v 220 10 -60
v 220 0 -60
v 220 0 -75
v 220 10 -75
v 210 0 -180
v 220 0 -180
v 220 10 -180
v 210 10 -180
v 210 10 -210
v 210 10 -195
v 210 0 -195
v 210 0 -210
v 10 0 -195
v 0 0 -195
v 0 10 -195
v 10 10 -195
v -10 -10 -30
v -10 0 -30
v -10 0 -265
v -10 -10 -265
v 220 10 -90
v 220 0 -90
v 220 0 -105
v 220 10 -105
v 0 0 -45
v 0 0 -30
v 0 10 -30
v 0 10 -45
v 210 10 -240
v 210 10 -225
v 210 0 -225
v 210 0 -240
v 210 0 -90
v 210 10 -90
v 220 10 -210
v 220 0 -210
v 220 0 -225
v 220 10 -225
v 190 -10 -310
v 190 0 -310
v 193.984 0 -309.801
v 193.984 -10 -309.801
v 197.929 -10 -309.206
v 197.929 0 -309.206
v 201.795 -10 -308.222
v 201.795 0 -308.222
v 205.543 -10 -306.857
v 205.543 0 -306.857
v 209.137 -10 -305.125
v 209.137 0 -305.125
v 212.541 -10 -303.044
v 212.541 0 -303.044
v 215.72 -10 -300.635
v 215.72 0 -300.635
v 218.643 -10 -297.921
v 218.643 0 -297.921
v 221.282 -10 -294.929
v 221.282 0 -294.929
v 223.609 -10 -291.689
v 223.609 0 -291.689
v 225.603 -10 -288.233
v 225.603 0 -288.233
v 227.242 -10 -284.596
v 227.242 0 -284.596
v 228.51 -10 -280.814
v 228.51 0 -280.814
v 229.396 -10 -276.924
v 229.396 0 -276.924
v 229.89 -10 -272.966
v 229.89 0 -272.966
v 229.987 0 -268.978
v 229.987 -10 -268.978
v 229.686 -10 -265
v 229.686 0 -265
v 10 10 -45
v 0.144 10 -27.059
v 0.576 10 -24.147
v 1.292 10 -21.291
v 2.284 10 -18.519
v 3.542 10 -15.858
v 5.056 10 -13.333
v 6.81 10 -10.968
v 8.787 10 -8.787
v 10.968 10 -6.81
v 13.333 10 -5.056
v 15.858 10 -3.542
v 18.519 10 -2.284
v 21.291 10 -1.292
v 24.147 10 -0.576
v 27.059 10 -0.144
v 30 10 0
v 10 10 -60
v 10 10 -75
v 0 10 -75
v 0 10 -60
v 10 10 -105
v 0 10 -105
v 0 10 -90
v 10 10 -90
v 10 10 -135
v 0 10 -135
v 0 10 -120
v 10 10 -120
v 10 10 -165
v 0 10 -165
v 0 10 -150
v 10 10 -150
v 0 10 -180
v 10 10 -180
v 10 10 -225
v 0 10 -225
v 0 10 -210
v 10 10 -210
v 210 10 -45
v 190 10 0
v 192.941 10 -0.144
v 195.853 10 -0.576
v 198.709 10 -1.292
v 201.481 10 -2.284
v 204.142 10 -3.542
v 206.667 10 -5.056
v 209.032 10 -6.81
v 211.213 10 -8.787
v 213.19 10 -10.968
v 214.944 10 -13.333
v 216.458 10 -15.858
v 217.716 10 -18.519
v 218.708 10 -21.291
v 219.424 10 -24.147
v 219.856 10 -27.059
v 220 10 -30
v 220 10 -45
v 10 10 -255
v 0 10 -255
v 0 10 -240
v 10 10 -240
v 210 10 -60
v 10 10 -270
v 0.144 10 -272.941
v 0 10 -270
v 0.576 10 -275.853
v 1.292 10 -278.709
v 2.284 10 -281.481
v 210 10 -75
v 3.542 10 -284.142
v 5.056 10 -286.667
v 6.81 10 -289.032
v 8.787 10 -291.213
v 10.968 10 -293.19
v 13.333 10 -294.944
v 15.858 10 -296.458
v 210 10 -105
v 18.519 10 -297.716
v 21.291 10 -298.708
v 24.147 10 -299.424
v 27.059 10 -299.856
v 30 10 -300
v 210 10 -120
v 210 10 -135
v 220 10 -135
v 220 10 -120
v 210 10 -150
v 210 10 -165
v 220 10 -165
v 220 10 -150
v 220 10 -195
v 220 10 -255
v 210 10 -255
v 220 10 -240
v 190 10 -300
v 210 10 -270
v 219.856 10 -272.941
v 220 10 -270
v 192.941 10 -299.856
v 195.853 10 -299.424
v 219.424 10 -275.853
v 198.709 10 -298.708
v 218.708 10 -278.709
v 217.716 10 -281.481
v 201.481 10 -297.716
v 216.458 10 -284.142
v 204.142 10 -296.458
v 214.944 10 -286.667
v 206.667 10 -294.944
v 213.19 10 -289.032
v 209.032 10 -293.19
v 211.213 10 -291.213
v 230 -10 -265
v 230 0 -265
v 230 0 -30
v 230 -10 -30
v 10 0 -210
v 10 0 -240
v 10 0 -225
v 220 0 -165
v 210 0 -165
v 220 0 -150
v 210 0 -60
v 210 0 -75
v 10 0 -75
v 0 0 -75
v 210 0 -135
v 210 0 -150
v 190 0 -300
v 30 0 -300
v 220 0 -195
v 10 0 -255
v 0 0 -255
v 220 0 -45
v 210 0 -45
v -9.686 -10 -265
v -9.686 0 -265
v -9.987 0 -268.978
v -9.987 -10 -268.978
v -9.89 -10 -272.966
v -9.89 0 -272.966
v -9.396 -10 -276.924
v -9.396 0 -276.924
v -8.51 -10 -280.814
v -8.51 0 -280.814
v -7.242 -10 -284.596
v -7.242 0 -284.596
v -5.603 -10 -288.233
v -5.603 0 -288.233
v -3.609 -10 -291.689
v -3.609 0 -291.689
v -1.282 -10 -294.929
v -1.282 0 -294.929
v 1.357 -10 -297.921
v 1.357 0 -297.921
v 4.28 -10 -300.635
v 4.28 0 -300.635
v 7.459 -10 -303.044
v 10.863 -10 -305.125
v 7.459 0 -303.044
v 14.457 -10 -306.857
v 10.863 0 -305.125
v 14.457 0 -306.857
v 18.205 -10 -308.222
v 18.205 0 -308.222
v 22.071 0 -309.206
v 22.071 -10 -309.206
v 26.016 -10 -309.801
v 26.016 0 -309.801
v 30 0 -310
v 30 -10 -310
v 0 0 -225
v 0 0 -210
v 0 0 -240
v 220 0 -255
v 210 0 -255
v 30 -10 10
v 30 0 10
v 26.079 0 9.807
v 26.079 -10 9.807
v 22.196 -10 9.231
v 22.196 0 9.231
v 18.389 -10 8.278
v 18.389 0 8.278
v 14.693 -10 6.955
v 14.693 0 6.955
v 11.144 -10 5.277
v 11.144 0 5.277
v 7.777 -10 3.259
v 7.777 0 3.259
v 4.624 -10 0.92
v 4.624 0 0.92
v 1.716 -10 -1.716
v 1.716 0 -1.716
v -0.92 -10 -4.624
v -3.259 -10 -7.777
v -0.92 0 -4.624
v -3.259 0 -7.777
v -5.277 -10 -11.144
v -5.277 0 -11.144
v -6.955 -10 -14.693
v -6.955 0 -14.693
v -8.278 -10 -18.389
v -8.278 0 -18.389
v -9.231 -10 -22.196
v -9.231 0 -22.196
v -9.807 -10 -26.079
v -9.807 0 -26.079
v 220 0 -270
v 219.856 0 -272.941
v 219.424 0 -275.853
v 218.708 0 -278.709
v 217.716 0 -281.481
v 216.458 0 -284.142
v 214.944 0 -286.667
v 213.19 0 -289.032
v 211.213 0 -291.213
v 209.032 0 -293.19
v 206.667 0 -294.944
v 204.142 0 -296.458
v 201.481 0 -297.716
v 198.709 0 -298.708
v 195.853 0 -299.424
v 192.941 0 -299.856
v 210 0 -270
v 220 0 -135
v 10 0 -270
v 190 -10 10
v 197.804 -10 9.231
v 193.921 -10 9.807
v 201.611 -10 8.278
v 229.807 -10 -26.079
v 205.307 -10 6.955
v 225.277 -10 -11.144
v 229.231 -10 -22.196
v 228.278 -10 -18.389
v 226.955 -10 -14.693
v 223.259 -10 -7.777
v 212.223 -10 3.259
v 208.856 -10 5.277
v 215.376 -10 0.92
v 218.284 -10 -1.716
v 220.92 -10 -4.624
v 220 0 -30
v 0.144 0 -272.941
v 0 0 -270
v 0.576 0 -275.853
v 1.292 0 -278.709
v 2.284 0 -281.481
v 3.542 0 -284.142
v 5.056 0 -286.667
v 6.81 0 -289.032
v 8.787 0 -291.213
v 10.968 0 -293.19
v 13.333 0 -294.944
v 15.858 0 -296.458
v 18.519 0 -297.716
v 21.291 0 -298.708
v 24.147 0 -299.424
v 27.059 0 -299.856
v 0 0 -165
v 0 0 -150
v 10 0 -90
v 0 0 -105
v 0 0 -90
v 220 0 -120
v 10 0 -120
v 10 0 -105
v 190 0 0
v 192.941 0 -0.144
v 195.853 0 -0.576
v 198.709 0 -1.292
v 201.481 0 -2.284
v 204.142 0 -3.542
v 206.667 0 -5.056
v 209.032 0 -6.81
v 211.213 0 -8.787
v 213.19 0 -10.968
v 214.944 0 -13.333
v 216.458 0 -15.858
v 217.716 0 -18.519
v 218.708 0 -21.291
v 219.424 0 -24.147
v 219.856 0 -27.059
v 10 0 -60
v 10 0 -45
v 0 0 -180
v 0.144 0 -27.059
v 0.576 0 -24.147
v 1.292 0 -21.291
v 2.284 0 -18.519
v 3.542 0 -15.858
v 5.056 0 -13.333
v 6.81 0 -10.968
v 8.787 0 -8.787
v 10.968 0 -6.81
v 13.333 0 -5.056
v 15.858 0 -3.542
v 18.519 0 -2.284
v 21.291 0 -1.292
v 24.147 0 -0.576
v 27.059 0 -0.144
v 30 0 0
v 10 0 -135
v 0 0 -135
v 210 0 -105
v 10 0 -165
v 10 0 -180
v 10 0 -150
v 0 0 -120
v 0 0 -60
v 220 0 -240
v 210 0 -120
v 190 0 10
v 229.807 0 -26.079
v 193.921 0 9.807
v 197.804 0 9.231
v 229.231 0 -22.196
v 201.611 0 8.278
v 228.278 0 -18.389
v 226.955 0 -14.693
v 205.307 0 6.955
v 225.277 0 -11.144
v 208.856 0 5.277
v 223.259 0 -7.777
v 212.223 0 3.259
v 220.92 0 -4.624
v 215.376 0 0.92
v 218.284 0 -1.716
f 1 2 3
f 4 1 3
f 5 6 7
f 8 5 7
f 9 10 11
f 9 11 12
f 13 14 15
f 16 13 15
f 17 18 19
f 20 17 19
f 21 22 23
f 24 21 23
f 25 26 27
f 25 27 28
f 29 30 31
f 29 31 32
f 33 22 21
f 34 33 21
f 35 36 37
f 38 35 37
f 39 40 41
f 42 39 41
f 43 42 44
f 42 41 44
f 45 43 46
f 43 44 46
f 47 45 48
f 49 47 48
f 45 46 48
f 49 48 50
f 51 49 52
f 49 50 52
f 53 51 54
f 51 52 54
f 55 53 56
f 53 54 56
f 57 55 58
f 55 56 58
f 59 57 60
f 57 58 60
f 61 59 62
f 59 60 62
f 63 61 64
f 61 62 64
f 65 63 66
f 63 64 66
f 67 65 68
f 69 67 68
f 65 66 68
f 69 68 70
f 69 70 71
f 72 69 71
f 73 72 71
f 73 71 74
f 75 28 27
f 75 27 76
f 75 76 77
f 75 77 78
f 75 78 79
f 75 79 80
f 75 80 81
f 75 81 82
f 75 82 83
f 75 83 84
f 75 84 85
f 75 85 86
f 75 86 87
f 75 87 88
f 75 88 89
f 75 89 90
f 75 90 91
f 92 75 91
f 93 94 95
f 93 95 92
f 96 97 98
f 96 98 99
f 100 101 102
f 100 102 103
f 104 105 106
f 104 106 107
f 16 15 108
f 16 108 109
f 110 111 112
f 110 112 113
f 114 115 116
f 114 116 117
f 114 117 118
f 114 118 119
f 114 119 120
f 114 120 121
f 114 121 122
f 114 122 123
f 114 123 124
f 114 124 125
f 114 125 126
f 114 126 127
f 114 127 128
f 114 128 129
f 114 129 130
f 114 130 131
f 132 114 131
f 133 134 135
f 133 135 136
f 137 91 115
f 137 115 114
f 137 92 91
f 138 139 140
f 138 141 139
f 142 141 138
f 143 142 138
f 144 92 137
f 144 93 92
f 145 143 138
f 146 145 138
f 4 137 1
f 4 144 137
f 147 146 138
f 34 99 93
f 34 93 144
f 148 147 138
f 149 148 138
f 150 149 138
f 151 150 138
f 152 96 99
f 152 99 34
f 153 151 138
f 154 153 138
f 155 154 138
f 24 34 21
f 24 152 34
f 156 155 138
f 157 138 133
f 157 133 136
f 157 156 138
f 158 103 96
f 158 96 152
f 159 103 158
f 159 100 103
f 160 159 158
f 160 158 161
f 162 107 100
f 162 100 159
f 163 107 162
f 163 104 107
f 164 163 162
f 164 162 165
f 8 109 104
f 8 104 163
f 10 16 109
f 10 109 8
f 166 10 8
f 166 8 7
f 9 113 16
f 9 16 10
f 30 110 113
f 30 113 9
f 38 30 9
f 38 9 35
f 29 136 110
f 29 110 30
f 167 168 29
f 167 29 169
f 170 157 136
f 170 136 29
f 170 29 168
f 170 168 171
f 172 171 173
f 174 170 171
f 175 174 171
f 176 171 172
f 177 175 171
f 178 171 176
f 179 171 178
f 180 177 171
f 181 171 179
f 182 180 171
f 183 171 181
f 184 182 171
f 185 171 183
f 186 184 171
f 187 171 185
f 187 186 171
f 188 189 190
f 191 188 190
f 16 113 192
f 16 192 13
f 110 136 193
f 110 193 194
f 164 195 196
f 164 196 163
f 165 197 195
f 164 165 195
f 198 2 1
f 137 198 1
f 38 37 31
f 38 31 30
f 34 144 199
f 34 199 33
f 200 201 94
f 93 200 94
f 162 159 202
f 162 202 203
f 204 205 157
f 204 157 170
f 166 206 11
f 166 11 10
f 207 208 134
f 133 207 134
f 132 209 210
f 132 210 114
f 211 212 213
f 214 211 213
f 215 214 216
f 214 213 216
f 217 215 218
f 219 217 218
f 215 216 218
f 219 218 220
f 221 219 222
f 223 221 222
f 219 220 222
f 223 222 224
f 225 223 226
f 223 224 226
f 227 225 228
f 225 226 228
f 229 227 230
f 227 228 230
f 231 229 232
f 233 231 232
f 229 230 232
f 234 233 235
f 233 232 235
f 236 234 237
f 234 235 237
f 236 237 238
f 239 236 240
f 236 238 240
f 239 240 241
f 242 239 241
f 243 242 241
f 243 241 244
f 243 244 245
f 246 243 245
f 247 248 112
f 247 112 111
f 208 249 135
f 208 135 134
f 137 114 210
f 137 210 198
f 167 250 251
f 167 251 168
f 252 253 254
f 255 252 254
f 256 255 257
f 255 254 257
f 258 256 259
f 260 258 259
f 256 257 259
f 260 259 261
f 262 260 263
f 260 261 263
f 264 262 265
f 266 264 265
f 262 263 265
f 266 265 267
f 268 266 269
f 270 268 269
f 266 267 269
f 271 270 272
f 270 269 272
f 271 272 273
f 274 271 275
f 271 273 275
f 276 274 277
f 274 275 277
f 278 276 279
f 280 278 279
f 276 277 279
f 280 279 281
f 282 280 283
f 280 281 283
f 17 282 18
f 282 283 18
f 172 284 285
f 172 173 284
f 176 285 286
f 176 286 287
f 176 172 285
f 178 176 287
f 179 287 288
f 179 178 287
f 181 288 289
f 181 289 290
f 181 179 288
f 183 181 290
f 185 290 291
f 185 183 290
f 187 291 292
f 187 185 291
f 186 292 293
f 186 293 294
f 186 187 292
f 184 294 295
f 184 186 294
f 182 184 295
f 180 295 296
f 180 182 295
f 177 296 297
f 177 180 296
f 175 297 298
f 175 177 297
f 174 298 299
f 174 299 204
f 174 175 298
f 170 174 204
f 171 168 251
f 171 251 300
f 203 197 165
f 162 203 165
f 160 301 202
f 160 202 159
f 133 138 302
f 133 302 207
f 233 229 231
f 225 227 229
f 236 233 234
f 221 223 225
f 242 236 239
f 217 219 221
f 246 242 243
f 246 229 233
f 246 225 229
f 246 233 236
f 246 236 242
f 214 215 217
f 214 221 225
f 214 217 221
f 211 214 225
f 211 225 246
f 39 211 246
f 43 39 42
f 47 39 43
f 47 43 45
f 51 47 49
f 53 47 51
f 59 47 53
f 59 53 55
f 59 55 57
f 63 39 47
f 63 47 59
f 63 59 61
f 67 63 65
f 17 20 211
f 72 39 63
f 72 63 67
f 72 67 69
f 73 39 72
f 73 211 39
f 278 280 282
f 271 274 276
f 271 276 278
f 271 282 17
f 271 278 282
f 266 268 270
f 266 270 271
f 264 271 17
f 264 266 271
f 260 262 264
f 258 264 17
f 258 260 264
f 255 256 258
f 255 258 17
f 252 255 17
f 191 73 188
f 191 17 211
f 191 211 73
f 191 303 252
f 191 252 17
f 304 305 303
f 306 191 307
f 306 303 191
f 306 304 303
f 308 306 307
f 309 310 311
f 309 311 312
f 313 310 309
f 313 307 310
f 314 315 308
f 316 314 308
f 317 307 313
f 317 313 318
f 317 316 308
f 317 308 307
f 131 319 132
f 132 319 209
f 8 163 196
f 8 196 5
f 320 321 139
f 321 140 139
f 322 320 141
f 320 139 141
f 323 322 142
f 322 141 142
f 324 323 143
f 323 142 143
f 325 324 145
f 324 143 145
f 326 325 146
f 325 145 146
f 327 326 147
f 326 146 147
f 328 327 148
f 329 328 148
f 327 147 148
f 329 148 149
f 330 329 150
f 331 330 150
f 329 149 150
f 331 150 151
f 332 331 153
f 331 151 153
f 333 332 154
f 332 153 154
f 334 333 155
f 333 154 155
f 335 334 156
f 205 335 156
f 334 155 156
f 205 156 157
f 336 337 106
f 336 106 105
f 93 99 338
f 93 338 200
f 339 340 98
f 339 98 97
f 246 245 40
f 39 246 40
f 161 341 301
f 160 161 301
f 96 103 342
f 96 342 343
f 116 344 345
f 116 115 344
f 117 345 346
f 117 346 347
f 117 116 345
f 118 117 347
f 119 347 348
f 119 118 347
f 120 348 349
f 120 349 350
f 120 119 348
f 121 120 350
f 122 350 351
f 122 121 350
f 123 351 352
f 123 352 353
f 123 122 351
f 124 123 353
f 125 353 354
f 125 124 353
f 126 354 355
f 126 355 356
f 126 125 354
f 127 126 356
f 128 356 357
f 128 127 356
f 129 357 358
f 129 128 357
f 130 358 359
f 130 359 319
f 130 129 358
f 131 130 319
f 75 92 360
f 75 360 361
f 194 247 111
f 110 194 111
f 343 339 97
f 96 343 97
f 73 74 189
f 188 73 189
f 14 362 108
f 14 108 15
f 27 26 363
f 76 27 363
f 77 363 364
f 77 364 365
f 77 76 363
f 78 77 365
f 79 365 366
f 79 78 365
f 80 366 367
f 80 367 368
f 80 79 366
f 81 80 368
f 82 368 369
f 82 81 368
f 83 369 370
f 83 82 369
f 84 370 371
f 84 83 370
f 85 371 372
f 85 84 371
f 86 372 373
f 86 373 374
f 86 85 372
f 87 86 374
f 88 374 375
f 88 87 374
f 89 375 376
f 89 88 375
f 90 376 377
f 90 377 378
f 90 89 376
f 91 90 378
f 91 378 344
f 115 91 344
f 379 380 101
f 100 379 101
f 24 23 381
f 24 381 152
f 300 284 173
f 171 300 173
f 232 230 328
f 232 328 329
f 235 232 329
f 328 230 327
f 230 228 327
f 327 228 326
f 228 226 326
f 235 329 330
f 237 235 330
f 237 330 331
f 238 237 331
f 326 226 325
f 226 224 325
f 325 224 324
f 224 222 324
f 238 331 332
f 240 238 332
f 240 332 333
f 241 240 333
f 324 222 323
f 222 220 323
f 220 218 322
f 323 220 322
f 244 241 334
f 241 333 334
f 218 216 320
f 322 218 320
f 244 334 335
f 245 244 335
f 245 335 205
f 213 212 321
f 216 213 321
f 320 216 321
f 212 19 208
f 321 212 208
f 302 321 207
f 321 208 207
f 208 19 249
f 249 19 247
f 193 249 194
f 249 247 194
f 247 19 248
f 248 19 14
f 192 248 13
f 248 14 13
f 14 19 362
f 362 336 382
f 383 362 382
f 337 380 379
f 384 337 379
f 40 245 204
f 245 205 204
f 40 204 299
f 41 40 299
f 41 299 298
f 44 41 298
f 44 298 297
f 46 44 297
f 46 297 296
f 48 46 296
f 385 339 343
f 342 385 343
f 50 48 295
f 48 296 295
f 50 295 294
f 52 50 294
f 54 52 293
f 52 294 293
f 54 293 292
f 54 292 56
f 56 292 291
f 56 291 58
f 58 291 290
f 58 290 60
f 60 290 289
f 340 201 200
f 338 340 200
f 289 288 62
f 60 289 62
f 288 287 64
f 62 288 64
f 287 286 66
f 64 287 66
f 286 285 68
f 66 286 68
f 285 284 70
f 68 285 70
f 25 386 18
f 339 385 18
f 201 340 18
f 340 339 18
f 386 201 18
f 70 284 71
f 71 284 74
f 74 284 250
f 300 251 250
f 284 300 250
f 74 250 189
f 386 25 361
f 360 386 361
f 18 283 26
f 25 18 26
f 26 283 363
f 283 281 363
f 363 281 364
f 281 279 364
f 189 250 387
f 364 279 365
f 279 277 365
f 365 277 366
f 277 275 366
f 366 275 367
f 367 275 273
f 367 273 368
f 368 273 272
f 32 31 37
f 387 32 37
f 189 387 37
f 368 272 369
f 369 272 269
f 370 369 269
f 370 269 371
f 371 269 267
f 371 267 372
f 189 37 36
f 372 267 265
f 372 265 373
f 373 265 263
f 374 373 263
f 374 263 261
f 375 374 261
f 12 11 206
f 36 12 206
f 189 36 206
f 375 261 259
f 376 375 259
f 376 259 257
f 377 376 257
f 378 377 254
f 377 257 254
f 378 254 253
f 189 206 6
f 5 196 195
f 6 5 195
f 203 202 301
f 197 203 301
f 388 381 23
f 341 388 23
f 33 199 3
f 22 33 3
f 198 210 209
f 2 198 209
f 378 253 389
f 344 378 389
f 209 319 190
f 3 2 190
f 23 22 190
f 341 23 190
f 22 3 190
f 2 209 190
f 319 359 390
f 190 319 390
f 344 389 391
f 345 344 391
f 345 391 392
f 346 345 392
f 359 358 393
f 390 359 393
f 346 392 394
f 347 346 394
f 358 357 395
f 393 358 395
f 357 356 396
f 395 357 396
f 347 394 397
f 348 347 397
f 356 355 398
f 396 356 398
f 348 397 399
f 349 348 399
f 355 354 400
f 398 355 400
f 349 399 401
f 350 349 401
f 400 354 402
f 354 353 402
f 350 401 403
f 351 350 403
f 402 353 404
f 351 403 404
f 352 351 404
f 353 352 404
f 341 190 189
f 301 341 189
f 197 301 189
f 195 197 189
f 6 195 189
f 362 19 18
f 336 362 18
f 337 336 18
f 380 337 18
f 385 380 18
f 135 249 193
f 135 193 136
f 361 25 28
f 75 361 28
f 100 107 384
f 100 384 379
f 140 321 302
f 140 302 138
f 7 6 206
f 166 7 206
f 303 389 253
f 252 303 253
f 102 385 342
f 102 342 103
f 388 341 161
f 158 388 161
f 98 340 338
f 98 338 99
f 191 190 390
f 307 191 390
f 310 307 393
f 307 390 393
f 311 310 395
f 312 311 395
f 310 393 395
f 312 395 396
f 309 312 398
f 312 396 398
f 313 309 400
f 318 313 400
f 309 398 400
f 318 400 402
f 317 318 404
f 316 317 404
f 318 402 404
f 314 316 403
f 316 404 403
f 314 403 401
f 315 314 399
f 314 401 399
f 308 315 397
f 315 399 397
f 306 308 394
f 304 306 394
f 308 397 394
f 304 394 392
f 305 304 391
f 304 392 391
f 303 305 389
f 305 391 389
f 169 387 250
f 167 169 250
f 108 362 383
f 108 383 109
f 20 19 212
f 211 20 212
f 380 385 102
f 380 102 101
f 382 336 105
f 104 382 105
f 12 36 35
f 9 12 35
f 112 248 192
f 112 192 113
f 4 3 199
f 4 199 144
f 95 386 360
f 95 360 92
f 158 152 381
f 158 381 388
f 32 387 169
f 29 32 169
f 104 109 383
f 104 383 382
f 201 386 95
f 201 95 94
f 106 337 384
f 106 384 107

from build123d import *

# Parameters (mm, degrees)
SKETCH1_W           = 220
SKETCH1_H           = 300
BOSS_EXTRUDE1_DEPTH = 10
FILLET1_R           = 30
SKETCH9_W           = 15
SKETCH9_H           = 10
CUT_EXTRUDE1_DEPTH  = 10
SKETCH8_W           = 15
SKETCH8_H           = 10
CUT_EXTRUDE2_DEPTH  = 10
BOSS_EXTRUDE3_DEPTH = 10


with BuildPart() as part:
    # Sketch1 → Boss-Extrude1 (new body)
    with BuildSketch(Plane(origin=(0, 0, 0), x_dir=(1, 0, 0), z_dir=(0, 1, 0))):
        with Locations((110, 150)):
            Rectangle(SKETCH1_W, SKETCH1_H)
    extrude(amount=BOSS_EXTRUDE1_DEPTH)

    # Fillet1
    fillet1_edges = [part.edges().sort_by_distance(p)[0] for p in [
        (0, 5, -300),
        (220, 5, -300),
        (220, 5, 0),
        (0, 5, 0),
    ]]
    fillet(fillet1_edges, radius=FILLET1_R)

    # Sketch9 → Cut-Extrude1 (cut)
    with BuildSketch(Plane(origin=(220, 0, 0), x_dir=(0, 0, -1), z_dir=(1, 0, 0))):
        with Locations((262.5, 5)):
            Rectangle(SKETCH9_W, SKETCH9_H)
        with Locations((232.5, 5)):
            Rectangle(SKETCH9_W, SKETCH9_H)
        with Locations((202.5, 5)):
            Rectangle(SKETCH9_W, SKETCH9_H)
        with Locations((172.5, 5)):
            Rectangle(SKETCH9_W, SKETCH9_H)
        with Locations((142.5, 5)):
            Rectangle(SKETCH9_W, SKETCH9_H)
        with Locations((112.5, 5)):
            Rectangle(SKETCH9_W, SKETCH9_H)
        with Locations((82.5, 5)):
            Rectangle(SKETCH9_W, SKETCH9_H)
        with Locations((52.5, 5)):
            Rectangle(SKETCH9_W, SKETCH9_H)
    extrude(amount=-CUT_EXTRUDE1_DEPTH, mode=Mode.SUBTRACT)

    # Sketch8 → Cut-Extrude2 (cut)
    with BuildSketch(Plane.ZY):
        with Locations((-262.5, 5)):
            Rectangle(SKETCH8_W, SKETCH8_H)
        with Locations((-232.5, 5)):
            Rectangle(SKETCH8_W, SKETCH8_H)
        with Locations((-202.5, 5)):
            Rectangle(SKETCH8_W, SKETCH8_H)
        with Locations((-172.5, 5)):
            Rectangle(SKETCH8_W, SKETCH8_H)
        with Locations((-142.5, 5)):
            Rectangle(SKETCH8_W, SKETCH8_H)
        with Locations((-112.5, 5)):
            Rectangle(SKETCH8_W, SKETCH8_H)
        with Locations((-82.5, 5)):
            Rectangle(SKETCH8_W, SKETCH8_H)
        with Locations((-52.5, 5)):
            Rectangle(SKETCH8_W, SKETCH8_H)
    extrude(amount=-CUT_EXTRUDE2_DEPTH, mode=Mode.SUBTRACT)

    # Sketch11 → Boss-Extrude3 (add)
    with BuildSketch(Plane.XZ):
        with BuildLine():
            Line((229.686269666, -265), (230, -265))
            Line((230, -265), (230, -30))
            ThreePointArc((230, -30), (218.284271247, -1.715728753), (190, 10))
            Line((190, 10), (30, 10))
            ThreePointArc((30, 10), (1.715728753, -1.715728753), (-10, -30))
            Line((-10, -30), (-10, -265))
            Line((-10, -265), (-9.686269666, -265))
            ThreePointArc((-9.686269666, -265), (0, -296.457513111), (30, -310))
            Line((30, -310), (190, -310))
            ThreePointArc((190, -310), (220, -296.457513111), (229.686269666, -265))
        make_face()
    extrude(amount=BOSS_EXTRUDE3_DEPTH)


solid = part.part
